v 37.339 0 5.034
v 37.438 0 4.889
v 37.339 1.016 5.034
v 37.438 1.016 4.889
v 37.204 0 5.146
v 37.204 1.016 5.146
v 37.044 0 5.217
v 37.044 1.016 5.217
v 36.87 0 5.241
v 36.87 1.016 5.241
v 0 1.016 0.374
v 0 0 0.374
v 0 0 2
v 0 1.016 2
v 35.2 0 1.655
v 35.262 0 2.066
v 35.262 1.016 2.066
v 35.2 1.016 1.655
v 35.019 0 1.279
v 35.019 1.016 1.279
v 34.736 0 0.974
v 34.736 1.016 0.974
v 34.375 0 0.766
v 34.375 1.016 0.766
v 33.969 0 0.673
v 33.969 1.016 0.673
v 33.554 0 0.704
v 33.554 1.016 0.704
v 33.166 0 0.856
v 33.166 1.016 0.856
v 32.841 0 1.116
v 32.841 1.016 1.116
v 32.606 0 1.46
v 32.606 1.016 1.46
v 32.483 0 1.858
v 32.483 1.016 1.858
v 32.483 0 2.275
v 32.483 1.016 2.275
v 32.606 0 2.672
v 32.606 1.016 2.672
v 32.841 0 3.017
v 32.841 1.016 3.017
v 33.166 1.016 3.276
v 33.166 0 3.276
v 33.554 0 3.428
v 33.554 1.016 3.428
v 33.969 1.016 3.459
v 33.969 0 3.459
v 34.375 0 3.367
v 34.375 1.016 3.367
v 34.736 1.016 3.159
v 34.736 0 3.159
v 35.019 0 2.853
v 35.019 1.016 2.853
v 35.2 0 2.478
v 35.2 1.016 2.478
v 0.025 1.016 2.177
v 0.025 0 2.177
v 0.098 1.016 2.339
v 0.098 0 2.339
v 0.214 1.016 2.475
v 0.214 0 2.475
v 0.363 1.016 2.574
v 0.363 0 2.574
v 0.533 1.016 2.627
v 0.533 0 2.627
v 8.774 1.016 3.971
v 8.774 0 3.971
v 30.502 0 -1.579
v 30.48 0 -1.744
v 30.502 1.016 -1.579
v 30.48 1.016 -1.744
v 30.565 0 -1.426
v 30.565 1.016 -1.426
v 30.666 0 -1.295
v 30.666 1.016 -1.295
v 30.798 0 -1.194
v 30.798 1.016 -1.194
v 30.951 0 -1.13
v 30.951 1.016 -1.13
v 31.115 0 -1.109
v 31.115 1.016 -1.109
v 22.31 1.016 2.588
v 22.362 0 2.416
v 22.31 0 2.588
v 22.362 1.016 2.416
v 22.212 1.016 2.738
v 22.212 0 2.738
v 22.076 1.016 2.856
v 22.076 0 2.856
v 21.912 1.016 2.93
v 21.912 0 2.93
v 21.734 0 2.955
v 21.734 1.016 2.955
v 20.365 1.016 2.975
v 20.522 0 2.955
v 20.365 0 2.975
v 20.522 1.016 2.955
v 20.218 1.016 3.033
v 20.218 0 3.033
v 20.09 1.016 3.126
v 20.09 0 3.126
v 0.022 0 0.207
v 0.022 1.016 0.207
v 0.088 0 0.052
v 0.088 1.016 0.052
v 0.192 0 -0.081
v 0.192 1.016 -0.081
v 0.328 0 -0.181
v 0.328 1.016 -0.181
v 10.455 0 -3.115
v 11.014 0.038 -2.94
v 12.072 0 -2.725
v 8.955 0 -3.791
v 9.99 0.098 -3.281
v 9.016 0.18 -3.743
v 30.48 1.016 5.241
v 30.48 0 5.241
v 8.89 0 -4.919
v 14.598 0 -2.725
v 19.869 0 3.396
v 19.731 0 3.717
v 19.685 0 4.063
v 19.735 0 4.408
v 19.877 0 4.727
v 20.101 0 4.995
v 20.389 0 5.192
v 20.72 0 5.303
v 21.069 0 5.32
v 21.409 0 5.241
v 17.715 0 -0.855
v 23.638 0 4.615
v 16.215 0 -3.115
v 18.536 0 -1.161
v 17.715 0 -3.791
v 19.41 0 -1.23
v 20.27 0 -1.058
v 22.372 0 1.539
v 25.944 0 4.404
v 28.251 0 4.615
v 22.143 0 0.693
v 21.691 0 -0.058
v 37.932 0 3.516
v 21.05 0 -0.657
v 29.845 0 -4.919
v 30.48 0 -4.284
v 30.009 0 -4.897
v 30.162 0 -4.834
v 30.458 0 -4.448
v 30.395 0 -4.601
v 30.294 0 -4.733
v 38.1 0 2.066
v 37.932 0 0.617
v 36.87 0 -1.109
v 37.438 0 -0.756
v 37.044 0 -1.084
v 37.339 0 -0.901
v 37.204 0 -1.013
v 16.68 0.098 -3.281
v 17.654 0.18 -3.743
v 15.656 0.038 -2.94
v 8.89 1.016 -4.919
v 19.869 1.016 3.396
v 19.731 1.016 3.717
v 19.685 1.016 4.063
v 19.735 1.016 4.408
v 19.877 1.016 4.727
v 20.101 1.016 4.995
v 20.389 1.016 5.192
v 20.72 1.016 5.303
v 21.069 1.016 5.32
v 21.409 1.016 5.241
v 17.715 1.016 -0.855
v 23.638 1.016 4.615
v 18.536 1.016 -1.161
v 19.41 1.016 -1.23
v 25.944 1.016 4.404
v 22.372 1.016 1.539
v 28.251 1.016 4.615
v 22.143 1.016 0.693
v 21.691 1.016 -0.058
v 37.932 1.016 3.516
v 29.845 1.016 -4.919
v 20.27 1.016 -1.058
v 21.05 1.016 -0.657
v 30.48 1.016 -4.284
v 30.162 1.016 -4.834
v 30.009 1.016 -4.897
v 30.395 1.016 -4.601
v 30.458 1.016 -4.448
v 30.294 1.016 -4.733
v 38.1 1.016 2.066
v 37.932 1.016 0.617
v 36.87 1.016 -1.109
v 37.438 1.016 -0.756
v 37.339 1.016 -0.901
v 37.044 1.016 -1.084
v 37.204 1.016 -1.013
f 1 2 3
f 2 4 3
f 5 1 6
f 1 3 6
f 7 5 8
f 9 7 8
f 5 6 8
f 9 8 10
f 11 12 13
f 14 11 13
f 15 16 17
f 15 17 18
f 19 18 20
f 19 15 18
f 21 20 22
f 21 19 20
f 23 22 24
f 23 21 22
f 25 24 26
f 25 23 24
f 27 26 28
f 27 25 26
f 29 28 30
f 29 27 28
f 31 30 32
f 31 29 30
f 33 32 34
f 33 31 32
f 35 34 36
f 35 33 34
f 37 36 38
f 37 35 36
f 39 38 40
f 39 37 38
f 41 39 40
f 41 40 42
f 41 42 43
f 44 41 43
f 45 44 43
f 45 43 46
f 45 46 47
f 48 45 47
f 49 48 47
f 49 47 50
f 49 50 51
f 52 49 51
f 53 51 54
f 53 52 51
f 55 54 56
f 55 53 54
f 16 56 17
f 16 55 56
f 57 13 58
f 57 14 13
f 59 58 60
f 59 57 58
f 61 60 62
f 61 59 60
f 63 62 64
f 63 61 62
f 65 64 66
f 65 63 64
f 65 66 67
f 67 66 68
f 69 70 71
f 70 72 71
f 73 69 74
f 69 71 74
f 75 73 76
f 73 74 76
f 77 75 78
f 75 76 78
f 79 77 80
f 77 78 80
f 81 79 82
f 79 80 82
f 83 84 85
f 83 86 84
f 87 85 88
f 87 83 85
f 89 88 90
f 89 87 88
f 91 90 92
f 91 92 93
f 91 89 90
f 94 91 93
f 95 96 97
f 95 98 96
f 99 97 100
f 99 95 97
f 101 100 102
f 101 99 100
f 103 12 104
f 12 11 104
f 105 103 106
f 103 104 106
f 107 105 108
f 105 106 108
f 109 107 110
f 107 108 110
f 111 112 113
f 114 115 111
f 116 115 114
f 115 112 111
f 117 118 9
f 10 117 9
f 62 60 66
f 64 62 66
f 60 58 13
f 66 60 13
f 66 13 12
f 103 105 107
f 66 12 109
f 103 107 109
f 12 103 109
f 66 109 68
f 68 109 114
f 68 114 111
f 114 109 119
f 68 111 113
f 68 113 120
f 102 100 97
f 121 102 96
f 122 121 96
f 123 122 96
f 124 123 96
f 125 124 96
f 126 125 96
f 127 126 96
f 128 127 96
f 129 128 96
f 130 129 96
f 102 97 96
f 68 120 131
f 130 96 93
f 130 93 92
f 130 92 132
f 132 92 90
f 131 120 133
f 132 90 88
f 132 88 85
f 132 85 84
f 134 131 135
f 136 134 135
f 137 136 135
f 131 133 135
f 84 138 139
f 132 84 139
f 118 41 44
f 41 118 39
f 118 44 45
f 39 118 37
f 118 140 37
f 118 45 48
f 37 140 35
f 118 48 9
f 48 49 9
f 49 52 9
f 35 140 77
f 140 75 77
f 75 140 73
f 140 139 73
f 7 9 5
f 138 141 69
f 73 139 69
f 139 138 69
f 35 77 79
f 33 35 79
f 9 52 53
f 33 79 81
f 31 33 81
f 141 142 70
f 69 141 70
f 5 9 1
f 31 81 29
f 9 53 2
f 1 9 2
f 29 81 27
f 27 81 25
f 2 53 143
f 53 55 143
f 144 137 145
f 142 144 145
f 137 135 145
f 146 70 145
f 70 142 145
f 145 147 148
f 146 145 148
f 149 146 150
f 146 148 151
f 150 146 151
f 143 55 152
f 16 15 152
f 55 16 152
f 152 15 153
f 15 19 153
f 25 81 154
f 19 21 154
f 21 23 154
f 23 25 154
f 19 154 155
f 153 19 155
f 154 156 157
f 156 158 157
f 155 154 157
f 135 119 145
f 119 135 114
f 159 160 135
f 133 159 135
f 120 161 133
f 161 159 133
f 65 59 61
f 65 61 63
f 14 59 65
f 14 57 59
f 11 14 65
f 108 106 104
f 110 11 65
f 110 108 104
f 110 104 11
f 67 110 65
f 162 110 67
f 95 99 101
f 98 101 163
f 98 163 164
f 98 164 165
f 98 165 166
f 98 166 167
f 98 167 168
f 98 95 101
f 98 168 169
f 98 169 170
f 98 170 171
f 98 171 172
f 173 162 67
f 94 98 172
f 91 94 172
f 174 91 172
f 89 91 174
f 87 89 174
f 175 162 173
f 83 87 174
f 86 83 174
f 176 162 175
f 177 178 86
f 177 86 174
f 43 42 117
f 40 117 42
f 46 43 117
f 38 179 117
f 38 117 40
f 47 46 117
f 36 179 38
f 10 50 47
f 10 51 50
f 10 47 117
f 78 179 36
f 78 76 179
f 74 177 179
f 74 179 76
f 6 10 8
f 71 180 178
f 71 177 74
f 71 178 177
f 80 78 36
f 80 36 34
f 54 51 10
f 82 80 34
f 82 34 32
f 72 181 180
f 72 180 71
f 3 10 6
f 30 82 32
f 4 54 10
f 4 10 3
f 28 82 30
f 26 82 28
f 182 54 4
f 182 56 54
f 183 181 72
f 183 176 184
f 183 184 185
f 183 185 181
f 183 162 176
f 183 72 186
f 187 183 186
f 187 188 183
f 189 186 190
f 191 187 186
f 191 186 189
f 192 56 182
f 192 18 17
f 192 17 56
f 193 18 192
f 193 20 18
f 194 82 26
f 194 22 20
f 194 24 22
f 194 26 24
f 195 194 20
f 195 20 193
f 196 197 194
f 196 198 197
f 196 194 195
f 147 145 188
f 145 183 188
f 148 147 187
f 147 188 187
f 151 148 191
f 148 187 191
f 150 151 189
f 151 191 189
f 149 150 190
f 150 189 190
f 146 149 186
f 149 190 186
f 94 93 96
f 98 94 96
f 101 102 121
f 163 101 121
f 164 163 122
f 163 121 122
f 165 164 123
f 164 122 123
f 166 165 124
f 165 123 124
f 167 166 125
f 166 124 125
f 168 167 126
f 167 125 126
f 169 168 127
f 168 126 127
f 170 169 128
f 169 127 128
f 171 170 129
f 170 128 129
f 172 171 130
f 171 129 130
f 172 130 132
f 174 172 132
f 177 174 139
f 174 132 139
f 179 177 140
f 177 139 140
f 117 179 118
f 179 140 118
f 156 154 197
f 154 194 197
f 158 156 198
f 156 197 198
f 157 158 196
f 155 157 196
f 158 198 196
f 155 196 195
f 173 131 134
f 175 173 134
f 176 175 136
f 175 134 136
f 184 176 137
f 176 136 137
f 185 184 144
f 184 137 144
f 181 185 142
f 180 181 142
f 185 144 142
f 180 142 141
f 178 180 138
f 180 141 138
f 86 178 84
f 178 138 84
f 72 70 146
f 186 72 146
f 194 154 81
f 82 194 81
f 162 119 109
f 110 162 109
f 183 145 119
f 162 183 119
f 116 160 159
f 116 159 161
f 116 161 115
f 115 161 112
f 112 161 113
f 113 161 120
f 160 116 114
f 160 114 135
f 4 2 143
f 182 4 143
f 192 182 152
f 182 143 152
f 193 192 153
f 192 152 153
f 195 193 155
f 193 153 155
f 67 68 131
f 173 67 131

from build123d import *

# Parameters (mm, degrees)
SKETCH1_R           = 1.397
BOSS_EXTRUDE1_DEPTH = 1.016
FILLET1_R           = 0.635
CUT_EXTRUDE1_DEPTH  = 0.381
CUT_EXTRUDE1_TAPER  = 5


with BuildPart() as part:
    # Sketch1 → Boss-Extrude1 (new body)
    with BuildSketch(Plane(origin=(0, 0, 0), x_dir=(1, 0, 0), z_dir=(0, 1, 0))):
        with BuildLine():
            Line((0, 0), (0, -2.54))
            Line((0, -2.54), (8.774021221, -3.97131115))
            Line((8.774021221, -3.97131115), (17.714676902, 0.85468885))
            ThreePointArc((17.714676902, 0.85468885), (21.270106923, 0.487494578), (22.230837366, -2.95531115))
            Line((22.230837366, -2.95531115), (20.32, -2.95531115))
            ThreePointArc((20.32, -2.95531115), (19.80856952, -4.601146953), (21.40873402, -5.24131115))
            ThreePointArc((21.40873402, -5.24131115), (25.94436701, -4.403774359), (30.48, -5.24131115))
            Line((30.48, -5.24131115), (37.249261314, -5.24131115))
            ThreePointArc((37.249261314, -5.24131115), (38.1, -2.06631115), (37.249261314, 1.10868885))
            Line((37.249261314, 1.10868885), (30.48, 1.10868885))
            Line((30.48, 1.10868885), (30.48, 4.91868885))
            Line((30.48, 4.91868885), (8.89, 4.91868885))
            Line((8.89, 4.91868885), (0, 0))
        make_face()
        with Locations((33.864630657, -2.06631115)):
            Circle(SKETCH1_R, mode=Mode.SUBTRACT)
    extrude(amount=BOSS_EXTRUDE1_DEPTH)

    # Fillet1
    fillet1_edges = [part.edges().sort_by_distance(p)[0] for p in [
        (30.48, 0.508, -4.91868885),
        (30.48, 0.508, -1.10868885),
        (37.249261314, 0.508, -1.10868885),
        (37.249261314, 0.508, 5.24131115),
        (20.32, 0.508, 2.95531115),
        (22.230837366, 0.508, 2.95531115),
        (0, 0.508, 2.54),
        (0, 0.508, 0),
    ]]
    fillet(fillet1_edges, radius=FILLET1_R)

    # Sketch3 → Cut-Extrude1 (cut)
    with BuildSketch(Plane(origin=(0, -0.841145333, -0.148316617), x_dir=(-1, 0, 0), z_dir=(0, -0.984807753, -0.173648178))):
        with BuildLine():
            ThreePointArc((-17.78, 3.750389462), (-13.335, 2.559355302), (-8.89, 3.750389462))
            Line((-8.89, 3.750389462), (-17.78, 3.750389462))
        make_face()
    extrude(amount=-CUT_EXTRUDE1_DEPTH, taper=CUT_EXTRUDE1_TAPER, mode=Mode.SUBTRACT)


solid = part.part
